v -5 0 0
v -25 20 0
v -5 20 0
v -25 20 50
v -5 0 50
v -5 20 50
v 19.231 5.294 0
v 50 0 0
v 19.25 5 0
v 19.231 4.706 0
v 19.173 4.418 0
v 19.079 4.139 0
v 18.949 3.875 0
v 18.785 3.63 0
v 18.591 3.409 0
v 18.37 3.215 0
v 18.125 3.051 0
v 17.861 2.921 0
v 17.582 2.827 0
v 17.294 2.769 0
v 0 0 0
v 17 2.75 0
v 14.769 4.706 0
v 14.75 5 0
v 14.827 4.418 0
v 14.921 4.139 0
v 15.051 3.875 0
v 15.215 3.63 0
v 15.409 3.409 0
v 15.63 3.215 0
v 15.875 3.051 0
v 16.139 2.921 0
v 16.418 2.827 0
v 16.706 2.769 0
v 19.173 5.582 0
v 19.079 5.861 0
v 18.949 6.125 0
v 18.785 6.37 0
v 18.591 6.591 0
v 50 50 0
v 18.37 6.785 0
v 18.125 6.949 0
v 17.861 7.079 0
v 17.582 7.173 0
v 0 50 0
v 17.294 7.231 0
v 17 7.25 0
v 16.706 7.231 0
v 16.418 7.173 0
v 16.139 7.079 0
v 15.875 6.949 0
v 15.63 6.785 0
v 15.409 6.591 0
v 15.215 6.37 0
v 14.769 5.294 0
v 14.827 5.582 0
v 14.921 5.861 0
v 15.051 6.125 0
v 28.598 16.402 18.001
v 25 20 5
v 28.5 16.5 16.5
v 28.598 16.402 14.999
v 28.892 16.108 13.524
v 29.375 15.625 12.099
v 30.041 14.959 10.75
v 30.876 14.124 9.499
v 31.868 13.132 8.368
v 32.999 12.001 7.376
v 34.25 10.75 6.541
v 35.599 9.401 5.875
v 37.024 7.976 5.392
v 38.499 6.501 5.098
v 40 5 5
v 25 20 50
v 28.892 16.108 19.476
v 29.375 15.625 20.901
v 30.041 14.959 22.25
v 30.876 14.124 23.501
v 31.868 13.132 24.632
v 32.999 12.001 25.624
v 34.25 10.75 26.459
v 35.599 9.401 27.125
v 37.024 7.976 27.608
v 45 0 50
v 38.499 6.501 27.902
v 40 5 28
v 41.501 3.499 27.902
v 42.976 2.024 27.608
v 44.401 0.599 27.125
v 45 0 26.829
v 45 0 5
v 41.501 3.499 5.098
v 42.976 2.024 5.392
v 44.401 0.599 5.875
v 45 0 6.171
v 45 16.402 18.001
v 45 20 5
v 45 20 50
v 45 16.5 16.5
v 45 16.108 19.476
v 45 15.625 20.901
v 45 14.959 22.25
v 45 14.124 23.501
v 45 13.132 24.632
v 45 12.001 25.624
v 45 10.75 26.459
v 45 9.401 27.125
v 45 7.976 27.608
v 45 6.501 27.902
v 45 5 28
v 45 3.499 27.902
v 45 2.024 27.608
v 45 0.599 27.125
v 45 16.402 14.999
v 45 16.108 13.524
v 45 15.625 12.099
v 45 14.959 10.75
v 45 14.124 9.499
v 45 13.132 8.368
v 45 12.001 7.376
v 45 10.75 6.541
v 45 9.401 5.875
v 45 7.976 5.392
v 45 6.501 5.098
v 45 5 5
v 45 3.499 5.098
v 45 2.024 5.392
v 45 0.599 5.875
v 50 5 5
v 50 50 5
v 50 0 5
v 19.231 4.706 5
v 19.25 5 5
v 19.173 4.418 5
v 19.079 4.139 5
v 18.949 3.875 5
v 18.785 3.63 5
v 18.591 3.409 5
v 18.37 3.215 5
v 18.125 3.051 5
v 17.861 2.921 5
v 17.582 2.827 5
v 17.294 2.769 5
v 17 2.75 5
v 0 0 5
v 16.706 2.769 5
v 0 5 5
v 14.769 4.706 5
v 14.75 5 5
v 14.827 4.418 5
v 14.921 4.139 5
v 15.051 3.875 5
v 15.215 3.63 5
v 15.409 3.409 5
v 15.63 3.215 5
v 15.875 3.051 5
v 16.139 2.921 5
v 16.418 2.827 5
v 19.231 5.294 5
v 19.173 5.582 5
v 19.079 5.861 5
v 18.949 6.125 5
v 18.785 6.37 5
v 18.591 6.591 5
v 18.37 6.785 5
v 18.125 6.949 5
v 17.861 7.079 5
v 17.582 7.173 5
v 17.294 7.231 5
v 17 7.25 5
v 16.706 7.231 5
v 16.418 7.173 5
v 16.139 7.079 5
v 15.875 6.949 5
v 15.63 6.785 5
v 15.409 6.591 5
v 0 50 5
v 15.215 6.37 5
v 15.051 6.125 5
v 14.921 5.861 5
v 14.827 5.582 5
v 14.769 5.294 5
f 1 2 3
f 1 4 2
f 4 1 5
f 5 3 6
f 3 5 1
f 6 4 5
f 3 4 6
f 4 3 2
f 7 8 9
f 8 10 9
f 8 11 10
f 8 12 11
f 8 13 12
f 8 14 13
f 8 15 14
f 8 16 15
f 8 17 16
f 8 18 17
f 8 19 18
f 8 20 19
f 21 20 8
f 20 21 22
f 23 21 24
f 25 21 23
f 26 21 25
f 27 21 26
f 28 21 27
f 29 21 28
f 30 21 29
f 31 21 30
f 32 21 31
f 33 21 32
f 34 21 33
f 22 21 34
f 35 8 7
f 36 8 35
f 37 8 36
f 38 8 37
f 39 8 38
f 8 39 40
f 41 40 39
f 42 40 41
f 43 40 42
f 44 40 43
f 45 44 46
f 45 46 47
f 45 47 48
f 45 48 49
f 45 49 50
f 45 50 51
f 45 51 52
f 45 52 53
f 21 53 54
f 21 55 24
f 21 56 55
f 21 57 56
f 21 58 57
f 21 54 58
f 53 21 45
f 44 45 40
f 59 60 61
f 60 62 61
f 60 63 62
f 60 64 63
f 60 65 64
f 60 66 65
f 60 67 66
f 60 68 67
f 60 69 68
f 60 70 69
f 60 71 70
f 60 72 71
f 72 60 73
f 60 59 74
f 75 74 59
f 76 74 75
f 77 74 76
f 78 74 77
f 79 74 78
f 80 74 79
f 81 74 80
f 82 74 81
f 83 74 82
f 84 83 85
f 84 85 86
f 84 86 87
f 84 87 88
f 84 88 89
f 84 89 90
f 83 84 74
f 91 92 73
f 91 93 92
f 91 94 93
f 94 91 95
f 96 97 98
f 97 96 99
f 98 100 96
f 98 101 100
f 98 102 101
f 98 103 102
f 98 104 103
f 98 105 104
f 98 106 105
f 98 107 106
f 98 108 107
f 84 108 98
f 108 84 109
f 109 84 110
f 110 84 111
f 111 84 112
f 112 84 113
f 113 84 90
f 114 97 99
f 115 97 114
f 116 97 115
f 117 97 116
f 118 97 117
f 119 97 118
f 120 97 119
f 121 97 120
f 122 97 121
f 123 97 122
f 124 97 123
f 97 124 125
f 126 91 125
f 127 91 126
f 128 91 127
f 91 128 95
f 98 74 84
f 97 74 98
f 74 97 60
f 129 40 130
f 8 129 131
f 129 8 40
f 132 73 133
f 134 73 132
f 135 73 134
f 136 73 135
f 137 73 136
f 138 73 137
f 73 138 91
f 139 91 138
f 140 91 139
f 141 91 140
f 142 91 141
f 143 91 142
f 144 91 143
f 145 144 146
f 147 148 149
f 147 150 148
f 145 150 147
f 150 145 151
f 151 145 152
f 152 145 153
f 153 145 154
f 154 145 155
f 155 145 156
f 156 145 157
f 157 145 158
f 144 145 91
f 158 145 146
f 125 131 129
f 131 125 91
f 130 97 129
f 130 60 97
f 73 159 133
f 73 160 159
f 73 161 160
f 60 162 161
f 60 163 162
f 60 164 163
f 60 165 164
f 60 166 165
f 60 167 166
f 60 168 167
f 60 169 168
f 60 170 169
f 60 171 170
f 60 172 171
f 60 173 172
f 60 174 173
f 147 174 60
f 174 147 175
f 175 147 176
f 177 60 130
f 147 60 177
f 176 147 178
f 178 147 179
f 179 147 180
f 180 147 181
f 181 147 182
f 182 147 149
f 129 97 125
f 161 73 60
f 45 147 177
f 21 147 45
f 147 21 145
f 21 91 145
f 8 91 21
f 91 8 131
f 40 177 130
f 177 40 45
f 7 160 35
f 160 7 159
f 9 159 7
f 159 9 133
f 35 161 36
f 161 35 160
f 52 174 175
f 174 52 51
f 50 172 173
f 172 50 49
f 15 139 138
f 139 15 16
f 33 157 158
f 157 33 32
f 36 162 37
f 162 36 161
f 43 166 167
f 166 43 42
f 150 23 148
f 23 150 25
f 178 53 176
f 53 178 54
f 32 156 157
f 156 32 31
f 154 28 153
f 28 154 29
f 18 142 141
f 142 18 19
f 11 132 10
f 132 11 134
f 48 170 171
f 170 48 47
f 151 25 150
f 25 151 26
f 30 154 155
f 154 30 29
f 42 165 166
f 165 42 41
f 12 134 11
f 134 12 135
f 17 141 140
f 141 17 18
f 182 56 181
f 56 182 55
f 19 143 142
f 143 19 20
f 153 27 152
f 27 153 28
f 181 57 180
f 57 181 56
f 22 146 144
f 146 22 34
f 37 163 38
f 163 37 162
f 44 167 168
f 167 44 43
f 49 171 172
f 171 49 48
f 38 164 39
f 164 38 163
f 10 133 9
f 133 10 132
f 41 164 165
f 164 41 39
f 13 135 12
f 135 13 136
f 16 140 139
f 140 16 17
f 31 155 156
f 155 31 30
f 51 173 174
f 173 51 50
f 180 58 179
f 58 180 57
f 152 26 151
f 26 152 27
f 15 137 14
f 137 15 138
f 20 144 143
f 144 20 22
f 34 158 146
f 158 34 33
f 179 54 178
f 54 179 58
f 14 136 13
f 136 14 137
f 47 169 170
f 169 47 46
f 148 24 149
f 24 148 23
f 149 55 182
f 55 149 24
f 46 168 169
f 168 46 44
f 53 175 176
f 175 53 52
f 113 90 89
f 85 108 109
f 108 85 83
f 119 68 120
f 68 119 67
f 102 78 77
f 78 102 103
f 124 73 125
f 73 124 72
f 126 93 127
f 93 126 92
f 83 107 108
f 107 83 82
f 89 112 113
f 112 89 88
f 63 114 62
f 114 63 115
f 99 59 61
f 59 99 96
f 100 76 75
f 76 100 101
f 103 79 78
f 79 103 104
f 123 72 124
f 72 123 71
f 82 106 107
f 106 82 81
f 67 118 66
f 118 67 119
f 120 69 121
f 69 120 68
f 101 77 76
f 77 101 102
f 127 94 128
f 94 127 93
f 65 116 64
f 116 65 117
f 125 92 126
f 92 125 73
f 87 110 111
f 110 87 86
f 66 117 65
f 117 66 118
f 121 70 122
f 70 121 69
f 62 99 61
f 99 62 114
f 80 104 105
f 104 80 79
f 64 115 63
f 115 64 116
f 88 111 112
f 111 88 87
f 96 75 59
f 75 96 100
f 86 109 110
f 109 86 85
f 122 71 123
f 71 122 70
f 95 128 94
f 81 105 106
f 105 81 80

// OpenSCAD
// L-shaped mounting bracket for a NEMA 17 stepper motor. NOVEL general structural part.
//

base_d  = 50;
base_t  = 5;
arm_l   = 50;
arm_t   = 5;
screw  = 4.5;

$fn = 48;

gusset_t = 5;
gusset_leg = 20;

difference() {
    union() {
        cube([base_d, base_t, base_t]);                 // base plate (square, not rectangular - the user's X range -25..25 is 50 mm)
        cube([base_d, arm_l, arm_t]);                   // vertical motor plate
        for (x = [-25, 25])
            translate([x, 0, 0])
                linear_extrude(arm_l)
                    polygon([[0, gusset_leg], [gusset_leg, gusset_leg], [gusset_leg, 0]]);   // gussets
    }
    translate([-17, base_t, -1]) cylinder(h = base_t + 2, d = screw);
    translate([17, base_t, -1]) cylinder(h = base_t + 2, d = screw);
    translate([0, arm_t, 28 - 11.5]) rotate([0, 90, 0]) cylinder(h = base_d + 2, d = 23);                 // motor boss hole (along Y)
    for (z = [28 - 15.5, 28 + 15.5])
        translate([0, arm_t, z]) rotate([90, 0, 0]) cylinder(h = base_d + 2, d = screw);                  // M3 screw holes
}
